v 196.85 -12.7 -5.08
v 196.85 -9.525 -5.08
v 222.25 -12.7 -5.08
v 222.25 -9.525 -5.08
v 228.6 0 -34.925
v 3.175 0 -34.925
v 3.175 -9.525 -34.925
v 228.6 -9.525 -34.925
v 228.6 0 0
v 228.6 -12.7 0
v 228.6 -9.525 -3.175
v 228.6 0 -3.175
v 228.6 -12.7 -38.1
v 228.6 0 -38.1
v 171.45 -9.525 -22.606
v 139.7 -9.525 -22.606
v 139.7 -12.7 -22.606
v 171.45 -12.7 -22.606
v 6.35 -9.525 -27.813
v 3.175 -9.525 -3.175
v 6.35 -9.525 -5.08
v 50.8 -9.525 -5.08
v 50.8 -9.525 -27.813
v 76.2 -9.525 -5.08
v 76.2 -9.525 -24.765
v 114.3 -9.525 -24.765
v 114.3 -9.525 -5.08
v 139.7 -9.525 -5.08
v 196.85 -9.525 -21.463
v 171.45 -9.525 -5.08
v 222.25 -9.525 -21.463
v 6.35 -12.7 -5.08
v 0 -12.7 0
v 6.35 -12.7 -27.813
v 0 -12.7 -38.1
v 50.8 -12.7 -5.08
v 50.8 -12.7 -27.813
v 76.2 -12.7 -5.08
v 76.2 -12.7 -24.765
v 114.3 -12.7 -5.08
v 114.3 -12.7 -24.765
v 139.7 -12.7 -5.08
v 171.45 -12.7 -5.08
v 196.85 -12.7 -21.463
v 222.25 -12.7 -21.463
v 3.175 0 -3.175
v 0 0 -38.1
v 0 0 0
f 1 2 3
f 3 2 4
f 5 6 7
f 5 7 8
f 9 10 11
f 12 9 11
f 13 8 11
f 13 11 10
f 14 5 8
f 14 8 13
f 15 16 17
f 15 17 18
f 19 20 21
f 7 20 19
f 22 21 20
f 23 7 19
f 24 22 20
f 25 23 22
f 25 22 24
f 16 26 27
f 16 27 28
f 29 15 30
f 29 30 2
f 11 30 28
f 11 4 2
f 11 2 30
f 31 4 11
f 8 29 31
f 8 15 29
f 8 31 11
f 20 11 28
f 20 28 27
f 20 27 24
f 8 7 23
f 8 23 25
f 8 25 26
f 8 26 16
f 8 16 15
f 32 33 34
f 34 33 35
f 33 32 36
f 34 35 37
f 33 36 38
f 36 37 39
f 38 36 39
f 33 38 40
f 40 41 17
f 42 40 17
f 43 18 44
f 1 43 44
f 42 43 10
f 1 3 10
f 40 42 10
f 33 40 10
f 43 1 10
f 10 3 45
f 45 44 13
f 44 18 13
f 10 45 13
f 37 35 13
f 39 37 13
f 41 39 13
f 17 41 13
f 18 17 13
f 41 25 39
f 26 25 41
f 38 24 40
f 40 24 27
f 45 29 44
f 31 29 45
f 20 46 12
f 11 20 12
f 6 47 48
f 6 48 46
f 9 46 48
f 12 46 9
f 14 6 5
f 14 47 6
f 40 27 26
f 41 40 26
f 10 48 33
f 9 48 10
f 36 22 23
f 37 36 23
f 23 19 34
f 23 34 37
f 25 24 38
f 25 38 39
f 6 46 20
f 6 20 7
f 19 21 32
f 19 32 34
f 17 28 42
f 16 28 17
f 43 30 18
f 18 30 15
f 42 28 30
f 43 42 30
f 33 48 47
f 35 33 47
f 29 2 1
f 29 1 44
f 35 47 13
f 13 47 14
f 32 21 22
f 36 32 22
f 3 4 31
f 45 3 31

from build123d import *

# Parameters (mm, degrees)
SKETCH1_W           = 228.6
SKETCH1_H           = 38.1
BOSS_EXTRUDE1_DEPTH = 12.7
SHELL1_T            = -3.175
SKETCH3_W           = 3.175
SKETCH3_H           = 31.75
CUT_EXTRUDE1_DEPTH  = 9.525
SKETCH4_W           = 25.4
SKETCH4_H           = 16.383
SKETCH4_W_2         = 31.75
SKETCH4_H_2         = 17.526
SKETCH4_W_3         = 38.1
SKETCH4_H_3         = 19.685
SKETCH4_W_4         = 44.45
SKETCH4_H_4         = 22.733
CUT_EXTRUDE2_DEPTH  = 232.948907359


with BuildPart() as part:
    # Sketch1 → Boss-Extrude1 (new body)
    with BuildSketch(Plane(origin=(0, 0, 0), x_dir=(1, 0, 0), z_dir=(0, 1, 0))):
        with Locations((114.3, 19.05)):
            Rectangle(SKETCH1_W, SKETCH1_H)
    extrude(amount=-BOSS_EXTRUDE1_DEPTH)

    # Shell1
    shell1_openings = [part.faces().sort_by_distance(p)[0] for p in [
        (114.3, 0, -19.05),
    ]]
    offset(amount=SHELL1_T, openings=shell1_openings, kind=Kind.INTERSECTION)

    # Sketch3 → Cut-Extrude1 (cut)
    with BuildSketch(Plane(origin=(0, 0, 0), x_dir=(1, 0, 0), z_dir=(0, 1, 0))):
        with Locations((227.0125, 19.05)):
            Rectangle(SKETCH3_W, SKETCH3_H)
    extrude(amount=-CUT_EXTRUDE1_DEPTH, mode=Mode.SUBTRACT)

    # Sketch4 → Cut-Extrude2 (cut, through all)
    with BuildSketch(Plane(origin=(0, -9.525, 0), x_dir=(1, 0, 0), z_dir=(0, 1, 0))):
        with Locations((209.55, 13.2715)):
            Rectangle(SKETCH4_W, SKETCH4_H)
        with Locations((155.575, 13.843)):
            Rectangle(SKETCH4_W_2, SKETCH4_H_2)
        with Locations((95.25, 14.9225)):
            Rectangle(SKETCH4_W_3, SKETCH4_H_3)
        with Locations((28.575, 16.4465)):
            Rectangle(SKETCH4_W_4, SKETCH4_H_4)
    extrude(amount=-CUT_EXTRUDE2_DEPTH, mode=Mode.SUBTRACT)


solid = part.part
